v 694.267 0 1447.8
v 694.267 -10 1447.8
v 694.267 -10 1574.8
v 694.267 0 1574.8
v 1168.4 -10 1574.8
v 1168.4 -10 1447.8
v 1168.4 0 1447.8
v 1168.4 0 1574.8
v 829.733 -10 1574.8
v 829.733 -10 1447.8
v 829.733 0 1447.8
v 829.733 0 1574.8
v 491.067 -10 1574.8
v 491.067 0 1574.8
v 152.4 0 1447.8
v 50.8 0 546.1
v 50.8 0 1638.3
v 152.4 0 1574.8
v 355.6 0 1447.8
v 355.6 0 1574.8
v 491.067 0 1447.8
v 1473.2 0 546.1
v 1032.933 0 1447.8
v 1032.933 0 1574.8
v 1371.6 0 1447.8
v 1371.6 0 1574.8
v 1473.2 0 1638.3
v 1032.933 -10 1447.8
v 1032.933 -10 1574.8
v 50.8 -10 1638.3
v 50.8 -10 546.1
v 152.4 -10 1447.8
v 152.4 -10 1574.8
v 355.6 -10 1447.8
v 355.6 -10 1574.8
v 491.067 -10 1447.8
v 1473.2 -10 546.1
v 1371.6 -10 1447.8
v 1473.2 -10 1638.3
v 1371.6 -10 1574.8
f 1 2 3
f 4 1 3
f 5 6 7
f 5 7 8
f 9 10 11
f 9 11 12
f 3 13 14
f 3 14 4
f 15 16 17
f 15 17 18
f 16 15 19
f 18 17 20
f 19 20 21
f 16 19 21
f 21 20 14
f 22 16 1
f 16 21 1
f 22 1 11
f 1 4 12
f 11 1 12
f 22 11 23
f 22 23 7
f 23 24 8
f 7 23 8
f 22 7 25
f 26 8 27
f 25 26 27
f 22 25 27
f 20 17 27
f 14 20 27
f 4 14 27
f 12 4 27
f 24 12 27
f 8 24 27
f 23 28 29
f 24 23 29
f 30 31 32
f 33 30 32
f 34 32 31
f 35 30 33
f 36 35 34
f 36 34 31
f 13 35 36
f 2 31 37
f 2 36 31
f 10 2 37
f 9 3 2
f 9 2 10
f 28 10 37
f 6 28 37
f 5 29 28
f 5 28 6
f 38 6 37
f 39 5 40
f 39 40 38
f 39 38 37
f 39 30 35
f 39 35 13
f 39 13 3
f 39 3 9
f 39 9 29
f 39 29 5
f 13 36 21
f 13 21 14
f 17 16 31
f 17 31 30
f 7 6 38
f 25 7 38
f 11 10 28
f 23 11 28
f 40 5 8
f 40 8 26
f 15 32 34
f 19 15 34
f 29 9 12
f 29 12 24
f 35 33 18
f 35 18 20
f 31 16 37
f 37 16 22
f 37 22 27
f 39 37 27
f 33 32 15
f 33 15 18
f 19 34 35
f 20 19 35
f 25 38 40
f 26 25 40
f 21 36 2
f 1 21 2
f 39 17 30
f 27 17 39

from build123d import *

# Parameters (mm, degrees)
SKETCH016_W         = 1422.4
SKETCH016_H         = 1092.2
PAD002_DEPTH        = 10.000005
SKETCH021_W         = 203.2
SKETCH021_H         = 127
POCKET018_DEPTH     = 10.0010050021
LINEARPATTERN_COUNT = 4
LINEARPATTERN_PITCH = 338.6666666667


with BuildPart() as part:
    # Sketch016 → Pad002 (new body)
    with BuildSketch(Plane.XZ):
        with Locations((762, 1092.2)):
            Rectangle(SKETCH016_W, SKETCH016_H)
    extrude(amount=PAD002_DEPTH)

    # Sketch021 → Pocket018 (cut, through all)
    with BuildSketch(Plane.XZ.offset(10.000005)):
        with Locations((254, 1511.3)):
            Rectangle(SKETCH021_W, SKETCH021_H)
    pocket018 = extrude(amount=-POCKET018_DEPTH, mode=Mode.SUBTRACT)

    # LinearPattern: Pocket018 ×4
    with Locations(*[(i * LINEARPATTERN_PITCH, 0, 0) for i in range(1, LINEARPATTERN_COUNT)]):
        add(pocket018, mode=Mode.SUBTRACT)


solid = part.part
